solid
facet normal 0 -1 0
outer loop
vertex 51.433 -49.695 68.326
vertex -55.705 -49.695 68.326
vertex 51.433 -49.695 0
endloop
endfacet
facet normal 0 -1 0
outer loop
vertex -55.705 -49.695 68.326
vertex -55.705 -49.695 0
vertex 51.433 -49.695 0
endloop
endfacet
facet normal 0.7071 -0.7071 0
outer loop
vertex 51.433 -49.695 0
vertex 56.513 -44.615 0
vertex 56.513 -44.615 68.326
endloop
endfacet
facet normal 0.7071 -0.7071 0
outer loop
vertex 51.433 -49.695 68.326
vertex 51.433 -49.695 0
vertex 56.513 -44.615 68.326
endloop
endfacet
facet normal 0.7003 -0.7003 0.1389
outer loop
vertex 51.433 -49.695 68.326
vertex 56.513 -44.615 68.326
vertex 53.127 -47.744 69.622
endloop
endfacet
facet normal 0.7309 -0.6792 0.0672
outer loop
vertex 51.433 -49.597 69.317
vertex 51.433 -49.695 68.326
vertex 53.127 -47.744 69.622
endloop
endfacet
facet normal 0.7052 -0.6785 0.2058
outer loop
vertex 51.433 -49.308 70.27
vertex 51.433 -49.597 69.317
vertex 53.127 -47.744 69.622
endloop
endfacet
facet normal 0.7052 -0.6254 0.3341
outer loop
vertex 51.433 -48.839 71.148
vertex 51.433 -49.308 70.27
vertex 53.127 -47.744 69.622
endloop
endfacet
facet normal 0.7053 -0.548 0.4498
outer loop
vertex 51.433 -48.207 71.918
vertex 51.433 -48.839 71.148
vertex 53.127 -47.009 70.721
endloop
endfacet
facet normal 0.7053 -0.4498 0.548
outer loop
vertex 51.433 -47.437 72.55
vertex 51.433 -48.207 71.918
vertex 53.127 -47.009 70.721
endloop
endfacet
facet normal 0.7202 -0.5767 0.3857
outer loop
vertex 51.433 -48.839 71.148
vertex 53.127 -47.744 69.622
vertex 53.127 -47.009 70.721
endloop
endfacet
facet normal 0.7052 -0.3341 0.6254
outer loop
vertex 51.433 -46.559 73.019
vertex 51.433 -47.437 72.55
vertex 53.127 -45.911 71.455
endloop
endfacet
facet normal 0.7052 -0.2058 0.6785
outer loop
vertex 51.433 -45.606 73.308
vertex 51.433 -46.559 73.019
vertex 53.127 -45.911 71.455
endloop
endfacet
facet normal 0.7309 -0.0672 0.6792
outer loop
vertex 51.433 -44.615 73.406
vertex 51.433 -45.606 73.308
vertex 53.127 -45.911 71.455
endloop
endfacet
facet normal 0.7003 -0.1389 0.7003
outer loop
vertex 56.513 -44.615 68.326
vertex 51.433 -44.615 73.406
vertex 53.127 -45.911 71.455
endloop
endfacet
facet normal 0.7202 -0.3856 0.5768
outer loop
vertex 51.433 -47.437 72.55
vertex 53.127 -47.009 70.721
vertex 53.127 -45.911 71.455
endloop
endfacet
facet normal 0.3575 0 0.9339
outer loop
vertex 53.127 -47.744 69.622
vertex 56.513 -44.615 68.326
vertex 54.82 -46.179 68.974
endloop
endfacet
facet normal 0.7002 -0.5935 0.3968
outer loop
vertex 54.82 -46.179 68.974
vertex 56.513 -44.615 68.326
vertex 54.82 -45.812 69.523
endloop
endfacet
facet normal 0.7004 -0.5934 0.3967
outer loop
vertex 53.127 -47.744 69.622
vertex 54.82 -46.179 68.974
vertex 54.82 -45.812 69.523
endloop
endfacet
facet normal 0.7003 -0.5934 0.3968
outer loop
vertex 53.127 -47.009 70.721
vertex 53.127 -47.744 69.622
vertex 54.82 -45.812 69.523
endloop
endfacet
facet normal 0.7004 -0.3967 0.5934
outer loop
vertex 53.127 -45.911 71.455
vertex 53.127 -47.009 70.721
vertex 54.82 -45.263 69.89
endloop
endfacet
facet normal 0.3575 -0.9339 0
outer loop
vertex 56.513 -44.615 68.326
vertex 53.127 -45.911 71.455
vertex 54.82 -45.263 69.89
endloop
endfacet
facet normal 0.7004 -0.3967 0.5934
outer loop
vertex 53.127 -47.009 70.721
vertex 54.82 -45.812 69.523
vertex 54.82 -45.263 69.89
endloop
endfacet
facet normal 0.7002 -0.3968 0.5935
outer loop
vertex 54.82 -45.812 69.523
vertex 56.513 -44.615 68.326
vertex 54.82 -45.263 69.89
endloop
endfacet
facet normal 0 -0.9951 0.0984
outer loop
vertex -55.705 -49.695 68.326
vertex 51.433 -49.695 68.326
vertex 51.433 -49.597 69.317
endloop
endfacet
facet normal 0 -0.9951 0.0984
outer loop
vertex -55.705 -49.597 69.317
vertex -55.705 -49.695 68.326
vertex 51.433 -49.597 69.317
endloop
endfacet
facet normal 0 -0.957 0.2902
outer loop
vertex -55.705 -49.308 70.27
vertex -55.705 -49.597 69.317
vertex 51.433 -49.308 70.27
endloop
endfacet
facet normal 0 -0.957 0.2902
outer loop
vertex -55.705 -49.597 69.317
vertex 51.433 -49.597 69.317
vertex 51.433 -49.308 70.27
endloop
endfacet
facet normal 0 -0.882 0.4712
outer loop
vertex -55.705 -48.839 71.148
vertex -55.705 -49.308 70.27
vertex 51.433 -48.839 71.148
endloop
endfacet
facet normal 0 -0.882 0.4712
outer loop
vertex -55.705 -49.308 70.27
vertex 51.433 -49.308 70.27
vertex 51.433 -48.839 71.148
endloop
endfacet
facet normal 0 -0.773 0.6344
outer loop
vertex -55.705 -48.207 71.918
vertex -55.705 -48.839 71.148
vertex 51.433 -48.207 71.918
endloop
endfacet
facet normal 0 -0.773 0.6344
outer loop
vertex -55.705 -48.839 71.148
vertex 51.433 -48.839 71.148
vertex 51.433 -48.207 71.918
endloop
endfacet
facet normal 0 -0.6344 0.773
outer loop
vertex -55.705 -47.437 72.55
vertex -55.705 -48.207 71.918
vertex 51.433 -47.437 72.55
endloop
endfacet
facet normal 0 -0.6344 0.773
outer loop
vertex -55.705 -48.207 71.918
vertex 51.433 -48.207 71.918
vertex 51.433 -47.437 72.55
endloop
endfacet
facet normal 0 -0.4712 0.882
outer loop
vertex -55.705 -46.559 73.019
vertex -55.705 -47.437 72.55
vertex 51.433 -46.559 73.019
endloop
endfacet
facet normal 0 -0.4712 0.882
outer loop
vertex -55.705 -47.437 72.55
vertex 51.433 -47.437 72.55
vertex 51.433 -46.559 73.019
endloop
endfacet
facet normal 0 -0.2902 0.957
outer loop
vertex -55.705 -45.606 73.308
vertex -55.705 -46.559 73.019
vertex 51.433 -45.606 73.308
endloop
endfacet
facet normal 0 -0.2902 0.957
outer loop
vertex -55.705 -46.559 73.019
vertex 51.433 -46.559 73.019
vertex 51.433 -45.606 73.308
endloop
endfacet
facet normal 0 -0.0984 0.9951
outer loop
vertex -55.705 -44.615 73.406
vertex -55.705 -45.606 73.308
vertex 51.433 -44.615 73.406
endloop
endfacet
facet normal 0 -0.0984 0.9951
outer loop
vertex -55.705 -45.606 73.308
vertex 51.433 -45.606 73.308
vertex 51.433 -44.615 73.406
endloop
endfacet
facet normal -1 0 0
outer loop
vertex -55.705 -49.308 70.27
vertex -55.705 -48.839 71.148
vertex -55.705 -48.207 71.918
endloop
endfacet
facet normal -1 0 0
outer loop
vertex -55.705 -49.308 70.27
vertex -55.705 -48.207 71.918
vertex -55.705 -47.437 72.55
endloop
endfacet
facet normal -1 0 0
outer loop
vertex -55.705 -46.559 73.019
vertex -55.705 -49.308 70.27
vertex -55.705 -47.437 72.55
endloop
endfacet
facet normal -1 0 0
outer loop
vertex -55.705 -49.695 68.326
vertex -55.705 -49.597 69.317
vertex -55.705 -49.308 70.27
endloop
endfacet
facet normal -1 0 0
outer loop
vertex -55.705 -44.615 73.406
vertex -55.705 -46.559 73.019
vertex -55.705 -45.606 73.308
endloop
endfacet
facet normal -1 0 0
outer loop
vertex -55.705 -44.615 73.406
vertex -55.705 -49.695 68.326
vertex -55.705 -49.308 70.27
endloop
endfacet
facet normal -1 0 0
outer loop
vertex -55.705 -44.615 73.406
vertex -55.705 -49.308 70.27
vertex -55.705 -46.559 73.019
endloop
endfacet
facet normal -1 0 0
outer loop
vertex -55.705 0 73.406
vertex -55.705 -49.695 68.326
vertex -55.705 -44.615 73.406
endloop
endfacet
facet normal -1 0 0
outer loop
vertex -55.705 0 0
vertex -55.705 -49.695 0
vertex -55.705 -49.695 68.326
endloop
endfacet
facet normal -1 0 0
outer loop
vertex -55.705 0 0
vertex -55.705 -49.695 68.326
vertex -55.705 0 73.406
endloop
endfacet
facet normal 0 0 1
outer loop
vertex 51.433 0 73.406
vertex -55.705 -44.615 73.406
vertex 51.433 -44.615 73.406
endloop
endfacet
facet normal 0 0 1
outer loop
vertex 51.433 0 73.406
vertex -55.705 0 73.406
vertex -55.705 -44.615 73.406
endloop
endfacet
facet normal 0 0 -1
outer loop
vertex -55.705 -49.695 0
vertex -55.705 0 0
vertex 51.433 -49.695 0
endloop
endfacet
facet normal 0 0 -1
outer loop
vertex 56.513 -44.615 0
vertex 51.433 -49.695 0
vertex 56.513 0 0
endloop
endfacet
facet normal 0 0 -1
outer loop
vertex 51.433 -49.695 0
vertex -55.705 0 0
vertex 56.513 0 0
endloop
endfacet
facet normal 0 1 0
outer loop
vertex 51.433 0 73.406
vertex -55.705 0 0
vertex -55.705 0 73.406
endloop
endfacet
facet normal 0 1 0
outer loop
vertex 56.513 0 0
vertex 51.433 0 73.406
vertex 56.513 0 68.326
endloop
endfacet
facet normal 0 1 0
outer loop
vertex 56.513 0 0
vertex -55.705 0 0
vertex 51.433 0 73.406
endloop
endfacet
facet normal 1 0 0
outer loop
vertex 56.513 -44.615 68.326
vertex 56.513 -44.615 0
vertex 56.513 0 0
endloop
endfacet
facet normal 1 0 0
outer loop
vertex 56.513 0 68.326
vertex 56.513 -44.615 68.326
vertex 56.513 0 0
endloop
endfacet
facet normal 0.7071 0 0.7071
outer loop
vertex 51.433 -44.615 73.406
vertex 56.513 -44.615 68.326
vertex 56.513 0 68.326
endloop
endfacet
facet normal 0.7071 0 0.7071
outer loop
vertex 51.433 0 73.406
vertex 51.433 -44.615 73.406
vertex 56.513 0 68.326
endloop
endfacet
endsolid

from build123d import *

# Parameters (mm, degrees)
F0_W     = 112.21791
F0_H     = 49.694728
F1_DEPTH = 73.406
F2_R     = 5.08
F3_SIZE  = 5.08


with BuildPart() as f1:
    # F0 (on Top) → F1 (new body)
    with BuildSketch(Plane.XY):
        with Locations((0.404328, -24.847364)):
            Rectangle(F0_W, F0_H)
    extrude(amount=F1_DEPTH)

    # F2
    f2_edges = [f1.edges().sort_by_distance(p)[0] for p in [
        (0.404328, -49.694728, 73.406),
    ]]
    fillet(f2_edges, radius=F2_R)

    # F3
    f3_edges = [f1.edges().sort_by_distance(p)[0] for p in [
        (56.513283, -22.307364, 73.406),
    ]]
    chamfer(f3_edges, length=F3_SIZE)


solid = f1.part
